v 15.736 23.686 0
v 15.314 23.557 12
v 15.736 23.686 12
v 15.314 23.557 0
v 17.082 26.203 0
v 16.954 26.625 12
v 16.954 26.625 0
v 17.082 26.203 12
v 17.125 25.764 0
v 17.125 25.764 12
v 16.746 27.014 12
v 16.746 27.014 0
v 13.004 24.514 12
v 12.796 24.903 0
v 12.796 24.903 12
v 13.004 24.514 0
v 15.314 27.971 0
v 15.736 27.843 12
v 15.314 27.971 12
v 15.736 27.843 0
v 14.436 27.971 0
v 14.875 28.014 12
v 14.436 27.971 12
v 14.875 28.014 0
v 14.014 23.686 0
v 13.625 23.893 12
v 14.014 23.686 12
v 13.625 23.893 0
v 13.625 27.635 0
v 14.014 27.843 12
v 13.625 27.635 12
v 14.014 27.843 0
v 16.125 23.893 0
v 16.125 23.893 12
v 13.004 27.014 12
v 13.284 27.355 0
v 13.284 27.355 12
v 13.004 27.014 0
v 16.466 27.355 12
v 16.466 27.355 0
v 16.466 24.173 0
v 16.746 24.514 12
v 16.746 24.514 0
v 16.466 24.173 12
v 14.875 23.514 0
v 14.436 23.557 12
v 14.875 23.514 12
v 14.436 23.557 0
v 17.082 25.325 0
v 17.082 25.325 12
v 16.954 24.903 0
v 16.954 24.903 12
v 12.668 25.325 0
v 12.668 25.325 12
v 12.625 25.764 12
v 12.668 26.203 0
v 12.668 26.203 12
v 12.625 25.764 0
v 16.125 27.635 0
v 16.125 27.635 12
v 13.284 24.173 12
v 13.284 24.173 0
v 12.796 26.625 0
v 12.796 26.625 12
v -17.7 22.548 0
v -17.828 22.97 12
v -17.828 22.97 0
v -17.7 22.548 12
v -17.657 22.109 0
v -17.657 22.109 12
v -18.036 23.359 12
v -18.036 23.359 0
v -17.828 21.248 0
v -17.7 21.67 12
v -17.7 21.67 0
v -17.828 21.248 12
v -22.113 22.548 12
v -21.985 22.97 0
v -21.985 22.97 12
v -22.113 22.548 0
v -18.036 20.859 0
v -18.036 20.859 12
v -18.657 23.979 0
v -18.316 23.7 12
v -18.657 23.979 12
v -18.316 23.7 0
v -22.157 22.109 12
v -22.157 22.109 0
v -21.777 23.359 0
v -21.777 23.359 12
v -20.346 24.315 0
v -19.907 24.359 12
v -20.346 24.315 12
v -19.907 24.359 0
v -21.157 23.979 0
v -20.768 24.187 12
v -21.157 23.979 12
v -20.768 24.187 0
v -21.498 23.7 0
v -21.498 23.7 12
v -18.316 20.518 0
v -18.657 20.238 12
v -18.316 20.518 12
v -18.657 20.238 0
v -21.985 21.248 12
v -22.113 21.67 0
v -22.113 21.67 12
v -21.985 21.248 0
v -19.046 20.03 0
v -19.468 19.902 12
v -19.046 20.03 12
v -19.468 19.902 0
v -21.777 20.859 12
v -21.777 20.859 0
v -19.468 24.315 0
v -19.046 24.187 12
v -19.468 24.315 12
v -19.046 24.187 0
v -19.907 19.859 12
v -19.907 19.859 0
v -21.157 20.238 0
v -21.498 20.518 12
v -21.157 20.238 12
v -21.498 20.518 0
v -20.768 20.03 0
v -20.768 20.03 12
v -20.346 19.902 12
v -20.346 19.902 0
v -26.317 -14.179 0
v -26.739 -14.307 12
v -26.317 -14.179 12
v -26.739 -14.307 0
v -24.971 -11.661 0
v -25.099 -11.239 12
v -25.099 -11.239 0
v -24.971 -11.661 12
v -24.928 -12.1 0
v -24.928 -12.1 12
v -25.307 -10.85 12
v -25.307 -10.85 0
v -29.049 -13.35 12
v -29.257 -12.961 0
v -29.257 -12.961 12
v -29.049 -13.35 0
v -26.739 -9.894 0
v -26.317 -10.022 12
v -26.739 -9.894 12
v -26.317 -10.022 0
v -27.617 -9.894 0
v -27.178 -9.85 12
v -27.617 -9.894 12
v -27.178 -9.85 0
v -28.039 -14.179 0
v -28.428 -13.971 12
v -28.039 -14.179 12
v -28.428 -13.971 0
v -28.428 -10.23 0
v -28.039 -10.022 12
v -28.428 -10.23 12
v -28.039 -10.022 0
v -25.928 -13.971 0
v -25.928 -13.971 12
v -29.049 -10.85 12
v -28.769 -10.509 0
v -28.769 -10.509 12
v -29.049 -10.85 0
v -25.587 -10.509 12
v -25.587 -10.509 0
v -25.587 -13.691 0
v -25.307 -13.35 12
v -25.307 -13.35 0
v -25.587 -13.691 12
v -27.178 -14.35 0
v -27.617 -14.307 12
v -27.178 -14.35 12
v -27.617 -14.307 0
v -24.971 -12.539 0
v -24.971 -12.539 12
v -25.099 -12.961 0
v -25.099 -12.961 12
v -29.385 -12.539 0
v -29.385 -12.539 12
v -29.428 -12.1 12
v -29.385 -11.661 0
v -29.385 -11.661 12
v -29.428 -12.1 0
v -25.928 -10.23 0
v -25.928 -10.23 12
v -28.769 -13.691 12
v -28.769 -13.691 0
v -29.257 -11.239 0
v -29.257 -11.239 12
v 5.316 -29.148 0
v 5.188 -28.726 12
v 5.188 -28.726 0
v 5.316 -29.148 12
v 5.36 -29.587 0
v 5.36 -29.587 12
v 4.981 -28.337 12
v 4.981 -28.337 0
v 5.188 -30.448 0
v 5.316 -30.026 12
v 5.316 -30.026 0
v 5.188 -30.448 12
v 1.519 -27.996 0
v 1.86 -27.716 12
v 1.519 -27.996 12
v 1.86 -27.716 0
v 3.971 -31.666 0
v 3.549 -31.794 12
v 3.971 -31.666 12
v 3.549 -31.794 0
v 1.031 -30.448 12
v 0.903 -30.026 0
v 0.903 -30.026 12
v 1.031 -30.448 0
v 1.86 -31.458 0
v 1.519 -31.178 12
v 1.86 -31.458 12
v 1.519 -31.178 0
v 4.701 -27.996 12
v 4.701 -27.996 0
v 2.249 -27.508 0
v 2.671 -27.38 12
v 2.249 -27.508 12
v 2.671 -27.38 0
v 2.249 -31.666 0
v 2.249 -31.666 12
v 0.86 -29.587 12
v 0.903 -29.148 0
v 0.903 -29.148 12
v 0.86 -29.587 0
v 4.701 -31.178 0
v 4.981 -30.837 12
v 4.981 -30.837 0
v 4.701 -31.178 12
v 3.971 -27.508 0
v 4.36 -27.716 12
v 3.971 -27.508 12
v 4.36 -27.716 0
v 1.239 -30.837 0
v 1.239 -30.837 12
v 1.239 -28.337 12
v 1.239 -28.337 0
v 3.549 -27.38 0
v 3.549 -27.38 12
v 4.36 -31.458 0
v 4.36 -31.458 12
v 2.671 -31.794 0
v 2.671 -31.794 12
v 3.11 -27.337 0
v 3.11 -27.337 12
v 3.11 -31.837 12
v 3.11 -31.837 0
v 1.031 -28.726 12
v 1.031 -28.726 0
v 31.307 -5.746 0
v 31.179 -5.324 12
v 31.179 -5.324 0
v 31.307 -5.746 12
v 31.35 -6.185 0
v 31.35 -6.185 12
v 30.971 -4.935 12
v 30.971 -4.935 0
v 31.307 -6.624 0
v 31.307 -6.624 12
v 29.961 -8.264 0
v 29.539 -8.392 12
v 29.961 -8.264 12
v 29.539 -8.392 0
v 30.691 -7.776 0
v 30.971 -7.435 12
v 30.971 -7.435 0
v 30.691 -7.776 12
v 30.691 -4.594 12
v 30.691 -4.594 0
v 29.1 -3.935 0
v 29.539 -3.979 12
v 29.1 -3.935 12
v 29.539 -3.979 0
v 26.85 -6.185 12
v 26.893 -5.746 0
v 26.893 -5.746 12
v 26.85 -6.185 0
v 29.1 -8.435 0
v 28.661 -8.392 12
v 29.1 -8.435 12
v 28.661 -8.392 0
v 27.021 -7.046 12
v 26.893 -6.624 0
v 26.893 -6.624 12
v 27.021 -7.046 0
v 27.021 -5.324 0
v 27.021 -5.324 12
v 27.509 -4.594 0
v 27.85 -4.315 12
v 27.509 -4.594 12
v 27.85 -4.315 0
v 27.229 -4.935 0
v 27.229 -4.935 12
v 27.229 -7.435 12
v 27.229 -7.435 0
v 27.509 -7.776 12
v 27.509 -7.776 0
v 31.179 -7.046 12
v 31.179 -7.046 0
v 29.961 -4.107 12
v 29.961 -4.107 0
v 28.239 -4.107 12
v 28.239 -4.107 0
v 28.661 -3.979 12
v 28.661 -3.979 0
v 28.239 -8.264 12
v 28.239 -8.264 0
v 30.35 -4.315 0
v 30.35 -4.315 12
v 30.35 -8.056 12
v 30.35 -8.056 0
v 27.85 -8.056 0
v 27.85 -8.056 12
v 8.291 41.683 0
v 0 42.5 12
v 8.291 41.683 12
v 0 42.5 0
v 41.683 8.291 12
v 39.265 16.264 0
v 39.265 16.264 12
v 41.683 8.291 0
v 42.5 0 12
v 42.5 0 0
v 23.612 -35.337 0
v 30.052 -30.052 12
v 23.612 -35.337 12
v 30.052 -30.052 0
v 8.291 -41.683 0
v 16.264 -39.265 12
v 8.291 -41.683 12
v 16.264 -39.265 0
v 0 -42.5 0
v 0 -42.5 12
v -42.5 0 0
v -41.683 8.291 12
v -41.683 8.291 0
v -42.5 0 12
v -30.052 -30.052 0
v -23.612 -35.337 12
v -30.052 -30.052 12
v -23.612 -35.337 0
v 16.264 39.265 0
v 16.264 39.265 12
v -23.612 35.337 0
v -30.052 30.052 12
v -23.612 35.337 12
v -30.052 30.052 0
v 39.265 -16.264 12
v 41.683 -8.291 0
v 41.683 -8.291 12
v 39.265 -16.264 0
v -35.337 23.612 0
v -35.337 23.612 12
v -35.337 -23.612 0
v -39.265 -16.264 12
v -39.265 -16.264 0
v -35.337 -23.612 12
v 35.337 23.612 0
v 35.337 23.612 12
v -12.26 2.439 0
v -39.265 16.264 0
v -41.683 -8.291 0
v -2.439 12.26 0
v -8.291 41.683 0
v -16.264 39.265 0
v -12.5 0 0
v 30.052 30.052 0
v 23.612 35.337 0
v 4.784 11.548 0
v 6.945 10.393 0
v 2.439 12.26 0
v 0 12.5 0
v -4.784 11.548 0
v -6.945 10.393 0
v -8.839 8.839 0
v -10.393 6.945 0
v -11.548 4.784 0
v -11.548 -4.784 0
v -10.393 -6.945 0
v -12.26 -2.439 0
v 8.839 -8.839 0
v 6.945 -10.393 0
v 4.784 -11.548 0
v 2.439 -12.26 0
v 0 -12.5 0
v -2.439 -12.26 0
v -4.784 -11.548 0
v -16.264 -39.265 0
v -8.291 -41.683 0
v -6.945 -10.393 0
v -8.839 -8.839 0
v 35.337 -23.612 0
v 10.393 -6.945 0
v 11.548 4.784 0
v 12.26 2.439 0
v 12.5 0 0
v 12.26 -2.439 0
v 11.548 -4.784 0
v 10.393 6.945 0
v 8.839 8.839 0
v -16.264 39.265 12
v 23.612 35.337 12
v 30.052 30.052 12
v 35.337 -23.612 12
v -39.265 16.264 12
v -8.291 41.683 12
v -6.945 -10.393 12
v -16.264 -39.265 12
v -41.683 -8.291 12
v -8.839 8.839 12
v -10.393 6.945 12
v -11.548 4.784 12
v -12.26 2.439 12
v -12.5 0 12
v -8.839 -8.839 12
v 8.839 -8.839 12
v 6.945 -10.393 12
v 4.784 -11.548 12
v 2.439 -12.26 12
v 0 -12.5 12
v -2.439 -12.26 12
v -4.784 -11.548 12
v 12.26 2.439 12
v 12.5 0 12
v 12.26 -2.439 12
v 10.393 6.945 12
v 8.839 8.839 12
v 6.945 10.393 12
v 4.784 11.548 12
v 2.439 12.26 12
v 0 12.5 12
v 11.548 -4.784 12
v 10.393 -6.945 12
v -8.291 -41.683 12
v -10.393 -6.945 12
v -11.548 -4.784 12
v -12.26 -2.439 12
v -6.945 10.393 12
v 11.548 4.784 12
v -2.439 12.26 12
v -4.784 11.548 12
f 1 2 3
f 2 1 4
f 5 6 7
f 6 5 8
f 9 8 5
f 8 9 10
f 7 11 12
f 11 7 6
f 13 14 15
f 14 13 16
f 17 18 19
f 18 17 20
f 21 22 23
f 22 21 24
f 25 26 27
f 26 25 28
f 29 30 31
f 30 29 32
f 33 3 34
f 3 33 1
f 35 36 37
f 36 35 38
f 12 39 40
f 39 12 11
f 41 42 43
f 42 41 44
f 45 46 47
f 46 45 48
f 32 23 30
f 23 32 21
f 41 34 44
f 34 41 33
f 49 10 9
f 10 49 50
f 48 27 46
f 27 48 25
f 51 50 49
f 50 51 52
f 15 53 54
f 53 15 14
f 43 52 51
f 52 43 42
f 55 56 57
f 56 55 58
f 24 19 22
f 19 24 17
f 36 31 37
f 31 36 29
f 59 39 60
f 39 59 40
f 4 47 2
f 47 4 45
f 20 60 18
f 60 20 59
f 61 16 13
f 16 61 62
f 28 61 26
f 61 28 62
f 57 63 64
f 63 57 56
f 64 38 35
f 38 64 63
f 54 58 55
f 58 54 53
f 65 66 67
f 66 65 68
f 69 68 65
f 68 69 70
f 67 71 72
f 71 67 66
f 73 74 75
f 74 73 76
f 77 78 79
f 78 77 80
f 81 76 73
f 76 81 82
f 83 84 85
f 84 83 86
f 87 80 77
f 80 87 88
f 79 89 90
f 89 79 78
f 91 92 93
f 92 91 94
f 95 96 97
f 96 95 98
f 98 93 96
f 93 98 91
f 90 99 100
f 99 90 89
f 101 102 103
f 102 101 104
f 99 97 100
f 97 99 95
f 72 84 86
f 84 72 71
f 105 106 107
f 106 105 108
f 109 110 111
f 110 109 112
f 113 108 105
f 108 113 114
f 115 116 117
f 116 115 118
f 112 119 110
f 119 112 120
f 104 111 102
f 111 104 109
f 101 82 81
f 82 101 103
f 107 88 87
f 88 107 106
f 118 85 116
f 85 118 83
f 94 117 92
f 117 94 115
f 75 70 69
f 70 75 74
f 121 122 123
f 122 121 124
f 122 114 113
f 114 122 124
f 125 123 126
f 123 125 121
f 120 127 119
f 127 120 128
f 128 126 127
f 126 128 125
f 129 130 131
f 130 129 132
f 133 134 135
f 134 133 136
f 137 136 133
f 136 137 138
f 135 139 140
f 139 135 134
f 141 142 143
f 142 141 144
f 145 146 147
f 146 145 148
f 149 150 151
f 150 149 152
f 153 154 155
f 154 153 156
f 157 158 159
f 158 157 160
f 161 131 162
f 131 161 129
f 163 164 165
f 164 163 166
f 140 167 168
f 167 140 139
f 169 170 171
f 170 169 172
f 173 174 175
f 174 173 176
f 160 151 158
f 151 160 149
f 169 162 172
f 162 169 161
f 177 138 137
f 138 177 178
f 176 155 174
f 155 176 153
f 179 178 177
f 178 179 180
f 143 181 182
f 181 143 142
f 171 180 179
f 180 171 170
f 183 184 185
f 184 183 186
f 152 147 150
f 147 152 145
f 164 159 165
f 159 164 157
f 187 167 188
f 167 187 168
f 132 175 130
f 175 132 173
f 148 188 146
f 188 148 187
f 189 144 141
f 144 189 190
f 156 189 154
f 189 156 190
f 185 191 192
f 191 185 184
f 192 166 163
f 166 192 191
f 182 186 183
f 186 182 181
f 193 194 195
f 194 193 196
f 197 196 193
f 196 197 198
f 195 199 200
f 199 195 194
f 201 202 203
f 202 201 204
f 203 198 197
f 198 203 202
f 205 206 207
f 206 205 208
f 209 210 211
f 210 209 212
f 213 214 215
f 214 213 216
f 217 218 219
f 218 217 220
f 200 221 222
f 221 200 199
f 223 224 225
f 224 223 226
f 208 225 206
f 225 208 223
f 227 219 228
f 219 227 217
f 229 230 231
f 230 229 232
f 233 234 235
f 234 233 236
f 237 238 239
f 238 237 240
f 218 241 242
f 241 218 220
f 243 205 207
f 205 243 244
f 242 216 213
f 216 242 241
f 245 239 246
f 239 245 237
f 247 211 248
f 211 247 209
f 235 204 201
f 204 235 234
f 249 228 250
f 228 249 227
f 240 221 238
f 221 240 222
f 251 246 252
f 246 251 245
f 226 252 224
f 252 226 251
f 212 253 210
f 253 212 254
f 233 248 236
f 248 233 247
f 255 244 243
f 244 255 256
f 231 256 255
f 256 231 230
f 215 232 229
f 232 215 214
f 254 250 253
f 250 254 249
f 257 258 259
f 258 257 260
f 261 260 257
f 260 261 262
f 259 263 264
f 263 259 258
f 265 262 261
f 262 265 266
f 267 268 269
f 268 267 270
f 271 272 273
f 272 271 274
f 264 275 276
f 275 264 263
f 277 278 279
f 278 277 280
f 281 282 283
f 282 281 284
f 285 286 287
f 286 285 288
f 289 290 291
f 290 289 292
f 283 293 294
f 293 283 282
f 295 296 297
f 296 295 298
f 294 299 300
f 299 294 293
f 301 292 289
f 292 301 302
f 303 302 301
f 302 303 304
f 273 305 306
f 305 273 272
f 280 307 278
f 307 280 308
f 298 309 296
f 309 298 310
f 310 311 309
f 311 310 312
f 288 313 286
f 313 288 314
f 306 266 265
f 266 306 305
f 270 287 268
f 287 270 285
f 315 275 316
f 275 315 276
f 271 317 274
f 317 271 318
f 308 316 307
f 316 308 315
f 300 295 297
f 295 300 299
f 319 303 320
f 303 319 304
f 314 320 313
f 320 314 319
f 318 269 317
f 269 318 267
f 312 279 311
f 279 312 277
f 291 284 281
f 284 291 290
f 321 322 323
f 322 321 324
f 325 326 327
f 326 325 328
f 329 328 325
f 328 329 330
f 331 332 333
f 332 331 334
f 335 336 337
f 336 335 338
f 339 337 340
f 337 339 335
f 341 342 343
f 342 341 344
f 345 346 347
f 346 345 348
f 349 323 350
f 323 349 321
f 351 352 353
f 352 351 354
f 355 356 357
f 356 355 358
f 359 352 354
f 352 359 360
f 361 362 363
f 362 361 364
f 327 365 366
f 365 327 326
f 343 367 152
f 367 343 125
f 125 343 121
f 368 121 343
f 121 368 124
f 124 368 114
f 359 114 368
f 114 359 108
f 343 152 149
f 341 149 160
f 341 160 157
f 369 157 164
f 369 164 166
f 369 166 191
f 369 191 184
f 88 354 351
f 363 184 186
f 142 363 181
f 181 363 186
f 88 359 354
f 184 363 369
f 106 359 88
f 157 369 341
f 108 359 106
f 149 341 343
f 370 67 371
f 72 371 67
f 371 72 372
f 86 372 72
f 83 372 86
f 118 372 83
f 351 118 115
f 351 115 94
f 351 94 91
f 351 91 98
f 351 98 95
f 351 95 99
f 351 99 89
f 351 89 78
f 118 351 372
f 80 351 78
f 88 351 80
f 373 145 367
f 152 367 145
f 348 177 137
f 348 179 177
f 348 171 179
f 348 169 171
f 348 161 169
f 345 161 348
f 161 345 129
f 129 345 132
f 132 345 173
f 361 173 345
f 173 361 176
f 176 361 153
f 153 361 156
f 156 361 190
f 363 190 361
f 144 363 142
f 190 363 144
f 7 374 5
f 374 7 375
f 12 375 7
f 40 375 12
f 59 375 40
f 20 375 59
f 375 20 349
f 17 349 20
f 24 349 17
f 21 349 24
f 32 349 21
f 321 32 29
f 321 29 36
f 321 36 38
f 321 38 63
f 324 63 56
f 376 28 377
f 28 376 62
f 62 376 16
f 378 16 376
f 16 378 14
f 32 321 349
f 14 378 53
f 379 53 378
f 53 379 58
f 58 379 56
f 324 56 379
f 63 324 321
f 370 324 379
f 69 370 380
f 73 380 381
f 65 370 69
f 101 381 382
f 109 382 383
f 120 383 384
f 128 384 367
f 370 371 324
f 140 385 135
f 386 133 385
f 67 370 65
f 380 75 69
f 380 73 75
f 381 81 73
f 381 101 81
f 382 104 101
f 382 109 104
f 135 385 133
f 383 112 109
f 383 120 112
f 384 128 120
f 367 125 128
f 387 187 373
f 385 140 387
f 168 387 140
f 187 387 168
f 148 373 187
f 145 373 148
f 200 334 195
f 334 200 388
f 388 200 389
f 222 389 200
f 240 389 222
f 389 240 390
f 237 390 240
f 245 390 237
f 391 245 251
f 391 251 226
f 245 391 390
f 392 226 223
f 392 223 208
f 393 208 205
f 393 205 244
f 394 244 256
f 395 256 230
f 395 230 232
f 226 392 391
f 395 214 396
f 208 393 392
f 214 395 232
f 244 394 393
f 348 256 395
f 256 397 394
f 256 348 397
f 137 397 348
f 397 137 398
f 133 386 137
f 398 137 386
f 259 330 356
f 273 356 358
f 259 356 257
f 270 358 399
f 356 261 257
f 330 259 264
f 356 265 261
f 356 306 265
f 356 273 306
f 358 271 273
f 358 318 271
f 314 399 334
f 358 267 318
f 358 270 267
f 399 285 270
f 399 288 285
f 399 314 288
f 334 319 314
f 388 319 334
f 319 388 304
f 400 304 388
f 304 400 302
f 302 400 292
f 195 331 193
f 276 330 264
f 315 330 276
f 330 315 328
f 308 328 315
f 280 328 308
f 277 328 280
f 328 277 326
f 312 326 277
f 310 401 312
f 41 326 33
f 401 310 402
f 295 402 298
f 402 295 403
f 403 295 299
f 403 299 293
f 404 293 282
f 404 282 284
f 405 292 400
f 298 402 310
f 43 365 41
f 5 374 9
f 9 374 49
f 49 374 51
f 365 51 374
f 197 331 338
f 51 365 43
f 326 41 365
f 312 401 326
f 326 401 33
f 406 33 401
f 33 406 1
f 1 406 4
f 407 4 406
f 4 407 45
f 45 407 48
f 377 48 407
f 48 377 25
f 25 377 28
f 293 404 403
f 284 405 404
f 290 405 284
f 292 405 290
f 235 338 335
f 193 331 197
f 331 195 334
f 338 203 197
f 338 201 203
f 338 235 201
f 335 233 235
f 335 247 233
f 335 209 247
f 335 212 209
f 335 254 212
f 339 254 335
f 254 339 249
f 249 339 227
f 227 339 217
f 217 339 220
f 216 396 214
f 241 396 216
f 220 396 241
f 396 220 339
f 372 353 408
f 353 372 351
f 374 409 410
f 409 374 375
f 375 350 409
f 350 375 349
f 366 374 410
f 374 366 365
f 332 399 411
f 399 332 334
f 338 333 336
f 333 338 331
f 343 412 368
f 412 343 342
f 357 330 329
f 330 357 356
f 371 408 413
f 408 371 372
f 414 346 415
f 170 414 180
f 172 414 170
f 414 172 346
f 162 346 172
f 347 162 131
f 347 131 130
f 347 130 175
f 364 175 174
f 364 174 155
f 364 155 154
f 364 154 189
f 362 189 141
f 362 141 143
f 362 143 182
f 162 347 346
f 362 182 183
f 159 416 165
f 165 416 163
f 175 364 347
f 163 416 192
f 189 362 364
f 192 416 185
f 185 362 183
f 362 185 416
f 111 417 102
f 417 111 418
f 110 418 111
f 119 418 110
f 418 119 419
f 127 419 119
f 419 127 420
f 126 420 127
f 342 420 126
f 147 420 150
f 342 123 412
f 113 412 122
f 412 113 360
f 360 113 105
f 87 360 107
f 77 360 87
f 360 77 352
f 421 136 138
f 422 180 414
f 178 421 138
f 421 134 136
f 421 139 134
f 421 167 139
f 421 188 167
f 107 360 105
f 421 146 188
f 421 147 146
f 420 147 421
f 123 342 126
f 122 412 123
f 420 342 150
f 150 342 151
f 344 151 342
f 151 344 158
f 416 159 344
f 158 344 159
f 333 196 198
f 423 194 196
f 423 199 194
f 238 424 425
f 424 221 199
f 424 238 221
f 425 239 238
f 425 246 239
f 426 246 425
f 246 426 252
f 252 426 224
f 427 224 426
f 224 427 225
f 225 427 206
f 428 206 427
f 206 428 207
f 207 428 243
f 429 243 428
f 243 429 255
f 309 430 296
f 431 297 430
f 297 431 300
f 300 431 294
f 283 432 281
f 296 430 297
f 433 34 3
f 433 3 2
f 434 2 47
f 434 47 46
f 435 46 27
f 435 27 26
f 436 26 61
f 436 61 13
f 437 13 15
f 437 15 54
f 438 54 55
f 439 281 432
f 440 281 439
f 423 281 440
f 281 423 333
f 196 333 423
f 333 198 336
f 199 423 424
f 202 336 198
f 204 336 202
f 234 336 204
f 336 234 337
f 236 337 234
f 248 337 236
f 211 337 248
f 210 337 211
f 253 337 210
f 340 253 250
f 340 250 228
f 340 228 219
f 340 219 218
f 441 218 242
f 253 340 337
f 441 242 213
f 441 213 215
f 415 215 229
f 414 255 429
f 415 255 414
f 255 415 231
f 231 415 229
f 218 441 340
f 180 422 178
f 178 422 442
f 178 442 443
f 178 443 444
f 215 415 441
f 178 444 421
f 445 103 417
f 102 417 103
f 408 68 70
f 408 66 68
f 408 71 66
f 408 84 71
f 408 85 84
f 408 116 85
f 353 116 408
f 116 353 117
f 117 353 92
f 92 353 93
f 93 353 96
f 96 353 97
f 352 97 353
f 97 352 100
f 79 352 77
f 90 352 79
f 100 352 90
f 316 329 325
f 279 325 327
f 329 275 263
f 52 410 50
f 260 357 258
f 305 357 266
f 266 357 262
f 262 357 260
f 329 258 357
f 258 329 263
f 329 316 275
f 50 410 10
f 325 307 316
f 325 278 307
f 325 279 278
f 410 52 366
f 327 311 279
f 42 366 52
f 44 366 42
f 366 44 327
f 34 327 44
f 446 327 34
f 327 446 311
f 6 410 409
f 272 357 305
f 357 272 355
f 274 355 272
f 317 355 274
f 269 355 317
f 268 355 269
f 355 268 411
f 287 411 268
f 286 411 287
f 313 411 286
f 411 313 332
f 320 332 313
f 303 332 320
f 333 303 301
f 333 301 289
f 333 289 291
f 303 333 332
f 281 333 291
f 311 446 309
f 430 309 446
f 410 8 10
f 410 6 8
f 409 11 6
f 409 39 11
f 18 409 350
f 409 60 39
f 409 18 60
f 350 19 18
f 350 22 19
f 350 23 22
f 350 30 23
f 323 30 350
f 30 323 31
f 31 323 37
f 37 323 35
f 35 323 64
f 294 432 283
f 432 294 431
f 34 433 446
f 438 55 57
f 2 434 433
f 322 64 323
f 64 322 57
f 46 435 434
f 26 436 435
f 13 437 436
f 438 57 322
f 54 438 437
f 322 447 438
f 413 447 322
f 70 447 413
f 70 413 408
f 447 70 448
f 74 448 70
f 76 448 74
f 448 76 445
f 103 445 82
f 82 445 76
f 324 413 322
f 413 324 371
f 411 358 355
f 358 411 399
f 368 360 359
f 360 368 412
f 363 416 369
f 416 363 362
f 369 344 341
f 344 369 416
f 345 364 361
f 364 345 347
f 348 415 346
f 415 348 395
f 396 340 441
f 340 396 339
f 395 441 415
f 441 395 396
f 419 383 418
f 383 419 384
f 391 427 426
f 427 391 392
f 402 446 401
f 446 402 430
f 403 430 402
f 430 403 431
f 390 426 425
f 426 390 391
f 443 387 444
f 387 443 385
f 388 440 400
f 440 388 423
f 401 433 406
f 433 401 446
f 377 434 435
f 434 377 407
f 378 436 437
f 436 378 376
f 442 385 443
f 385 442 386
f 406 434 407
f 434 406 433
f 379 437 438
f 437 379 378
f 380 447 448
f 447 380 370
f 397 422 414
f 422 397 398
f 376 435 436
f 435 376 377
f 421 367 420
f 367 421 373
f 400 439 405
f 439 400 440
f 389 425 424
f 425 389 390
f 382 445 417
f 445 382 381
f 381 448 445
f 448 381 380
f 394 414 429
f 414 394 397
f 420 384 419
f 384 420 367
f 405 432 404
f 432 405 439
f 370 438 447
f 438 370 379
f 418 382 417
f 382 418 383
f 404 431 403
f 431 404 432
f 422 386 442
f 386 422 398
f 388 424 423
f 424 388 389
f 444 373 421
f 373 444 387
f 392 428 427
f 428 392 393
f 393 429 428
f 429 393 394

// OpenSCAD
$fn = 32;

// ----------------------------------------------------------------------
// Flange Ø85 x 12
// 5 holes on a Ø59.5 bolt circle, bolted joints
// ----------------------------------------------------------------------

// --- parameters (mm) ---
flange_d = 85;   // outside diameter of the flange
thickness = 12;  // flange thickness
holes = 5;       // number of bolt holes
pcd = 59.5;      // bolt circle diameter
start_deg = 60;  // angle of the first hole, from +X
hole_d = 4.5;    // bolt hole diameter
bore_d = 25;     // central through bore
hub_d = 33;      // hub outside diameter
hub_h = 0;       // hub height above the flange face (0 = no hub)

// --- derived feature positions (mm) ---
height = thickness + hub_h;  // = 12   overall height of the part
pcd_r = pcd / 2;             // = 29.75   bolt circle radius
hole_step = 360 / holes;     // = 72   angular pitch
feature_centers = [
  [pcd_r * cos(start_deg + 0 * hole_step), pcd_r * sin(start_deg + 0 * hole_step)],
  [pcd_r * cos(start_deg + 1 * hole_step), pcd_r * sin(start_deg + 1 * hole_step)],
  [pcd_r * cos(start_deg + 2 * hole_step), pcd_r * sin(start_deg + 2 * hole_step)],
  [pcd_r * cos(start_deg + 3 * hole_step), pcd_r * sin(start_deg + 3 * hole_step)],
  [pcd_r * cos(start_deg + 4 * hole_step), pcd_r * sin(start_deg + 4 * hole_step)]
];   // bolt hole centres on the pitch circle

// flange disc, every hole and the bore cut straight through
difference() {
  union() {
    cylinder(d = flange_d, h = thickness);
  }
  translate([0, 0, -1]) cylinder(d = bore_d, h = height + 2);  // bore, through
  for (centre = feature_centers)
    translate([centre[0], centre[1], -1]) cylinder(d = hole_d, h = thickness + 2);
}
